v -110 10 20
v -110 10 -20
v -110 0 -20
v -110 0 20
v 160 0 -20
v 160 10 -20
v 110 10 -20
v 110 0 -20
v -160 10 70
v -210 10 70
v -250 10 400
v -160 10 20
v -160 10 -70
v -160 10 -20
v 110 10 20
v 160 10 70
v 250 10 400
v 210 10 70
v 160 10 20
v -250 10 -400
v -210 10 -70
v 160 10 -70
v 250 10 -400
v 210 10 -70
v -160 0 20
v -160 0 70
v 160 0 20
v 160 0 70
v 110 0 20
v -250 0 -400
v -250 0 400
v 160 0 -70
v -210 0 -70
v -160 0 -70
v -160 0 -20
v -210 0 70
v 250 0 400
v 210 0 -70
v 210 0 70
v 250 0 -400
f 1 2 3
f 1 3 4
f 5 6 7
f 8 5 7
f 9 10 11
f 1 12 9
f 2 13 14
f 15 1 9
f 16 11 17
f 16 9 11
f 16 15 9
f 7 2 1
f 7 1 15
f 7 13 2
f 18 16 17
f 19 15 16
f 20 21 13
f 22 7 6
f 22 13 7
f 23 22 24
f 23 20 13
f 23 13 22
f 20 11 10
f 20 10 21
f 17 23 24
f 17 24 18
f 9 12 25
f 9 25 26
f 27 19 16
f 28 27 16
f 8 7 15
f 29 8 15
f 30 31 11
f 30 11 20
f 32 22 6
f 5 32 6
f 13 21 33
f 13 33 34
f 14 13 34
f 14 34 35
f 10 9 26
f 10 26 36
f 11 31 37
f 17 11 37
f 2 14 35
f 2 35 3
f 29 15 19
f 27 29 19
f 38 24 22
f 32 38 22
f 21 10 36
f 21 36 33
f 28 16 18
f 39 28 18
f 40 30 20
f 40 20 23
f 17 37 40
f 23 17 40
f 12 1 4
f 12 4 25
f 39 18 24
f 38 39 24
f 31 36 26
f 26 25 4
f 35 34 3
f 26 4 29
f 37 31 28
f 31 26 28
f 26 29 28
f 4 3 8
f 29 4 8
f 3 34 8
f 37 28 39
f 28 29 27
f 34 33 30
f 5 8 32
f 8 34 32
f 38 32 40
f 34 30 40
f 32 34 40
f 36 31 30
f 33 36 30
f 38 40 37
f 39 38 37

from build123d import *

# Parameters (mm, degrees)
SKETCH1_W           = 500
SKETCH1_H           = 800
BOSS_EXTRUDE1_DEPTH = 10
CUT_EXTRUDE1_DEPTH  = 10


with BuildPart() as part:
    # Sketch1 → Boss-Extrude1 (new body)
    with BuildSketch(Plane(origin=(0, 0, 0), x_dir=(1, 0, 0), z_dir=(0, 1, 0))):
        Rectangle(SKETCH1_W, SKETCH1_H)
    extrude(amount=BOSS_EXTRUDE1_DEPTH)

    # Sketch2 → Cut-Extrude1 (cut)
    with BuildSketch(Plane(origin=(0, 10, 0), x_dir=(1, 0, 0), z_dir=(0, 1, 0))):
        Polygon((-160, -70), (-210, -70), (-210, 70), (-160, 70), (-160, 20), (-110, 20), (-110, -20), (-160, -20), align=None)
    cut_extrude1 = extrude(amount=-CUT_EXTRUDE1_DEPTH, mode=Mode.SUBTRACT)

    # Mirror1: Cut-Extrude1 across plane
    add(cut_extrude1.mirror(Plane(origin=(0, 0, 0), x_dir=(0, 0, 1), z_dir=(1, 0, 0))), mode=Mode.SUBTRACT)


solid = part.part
